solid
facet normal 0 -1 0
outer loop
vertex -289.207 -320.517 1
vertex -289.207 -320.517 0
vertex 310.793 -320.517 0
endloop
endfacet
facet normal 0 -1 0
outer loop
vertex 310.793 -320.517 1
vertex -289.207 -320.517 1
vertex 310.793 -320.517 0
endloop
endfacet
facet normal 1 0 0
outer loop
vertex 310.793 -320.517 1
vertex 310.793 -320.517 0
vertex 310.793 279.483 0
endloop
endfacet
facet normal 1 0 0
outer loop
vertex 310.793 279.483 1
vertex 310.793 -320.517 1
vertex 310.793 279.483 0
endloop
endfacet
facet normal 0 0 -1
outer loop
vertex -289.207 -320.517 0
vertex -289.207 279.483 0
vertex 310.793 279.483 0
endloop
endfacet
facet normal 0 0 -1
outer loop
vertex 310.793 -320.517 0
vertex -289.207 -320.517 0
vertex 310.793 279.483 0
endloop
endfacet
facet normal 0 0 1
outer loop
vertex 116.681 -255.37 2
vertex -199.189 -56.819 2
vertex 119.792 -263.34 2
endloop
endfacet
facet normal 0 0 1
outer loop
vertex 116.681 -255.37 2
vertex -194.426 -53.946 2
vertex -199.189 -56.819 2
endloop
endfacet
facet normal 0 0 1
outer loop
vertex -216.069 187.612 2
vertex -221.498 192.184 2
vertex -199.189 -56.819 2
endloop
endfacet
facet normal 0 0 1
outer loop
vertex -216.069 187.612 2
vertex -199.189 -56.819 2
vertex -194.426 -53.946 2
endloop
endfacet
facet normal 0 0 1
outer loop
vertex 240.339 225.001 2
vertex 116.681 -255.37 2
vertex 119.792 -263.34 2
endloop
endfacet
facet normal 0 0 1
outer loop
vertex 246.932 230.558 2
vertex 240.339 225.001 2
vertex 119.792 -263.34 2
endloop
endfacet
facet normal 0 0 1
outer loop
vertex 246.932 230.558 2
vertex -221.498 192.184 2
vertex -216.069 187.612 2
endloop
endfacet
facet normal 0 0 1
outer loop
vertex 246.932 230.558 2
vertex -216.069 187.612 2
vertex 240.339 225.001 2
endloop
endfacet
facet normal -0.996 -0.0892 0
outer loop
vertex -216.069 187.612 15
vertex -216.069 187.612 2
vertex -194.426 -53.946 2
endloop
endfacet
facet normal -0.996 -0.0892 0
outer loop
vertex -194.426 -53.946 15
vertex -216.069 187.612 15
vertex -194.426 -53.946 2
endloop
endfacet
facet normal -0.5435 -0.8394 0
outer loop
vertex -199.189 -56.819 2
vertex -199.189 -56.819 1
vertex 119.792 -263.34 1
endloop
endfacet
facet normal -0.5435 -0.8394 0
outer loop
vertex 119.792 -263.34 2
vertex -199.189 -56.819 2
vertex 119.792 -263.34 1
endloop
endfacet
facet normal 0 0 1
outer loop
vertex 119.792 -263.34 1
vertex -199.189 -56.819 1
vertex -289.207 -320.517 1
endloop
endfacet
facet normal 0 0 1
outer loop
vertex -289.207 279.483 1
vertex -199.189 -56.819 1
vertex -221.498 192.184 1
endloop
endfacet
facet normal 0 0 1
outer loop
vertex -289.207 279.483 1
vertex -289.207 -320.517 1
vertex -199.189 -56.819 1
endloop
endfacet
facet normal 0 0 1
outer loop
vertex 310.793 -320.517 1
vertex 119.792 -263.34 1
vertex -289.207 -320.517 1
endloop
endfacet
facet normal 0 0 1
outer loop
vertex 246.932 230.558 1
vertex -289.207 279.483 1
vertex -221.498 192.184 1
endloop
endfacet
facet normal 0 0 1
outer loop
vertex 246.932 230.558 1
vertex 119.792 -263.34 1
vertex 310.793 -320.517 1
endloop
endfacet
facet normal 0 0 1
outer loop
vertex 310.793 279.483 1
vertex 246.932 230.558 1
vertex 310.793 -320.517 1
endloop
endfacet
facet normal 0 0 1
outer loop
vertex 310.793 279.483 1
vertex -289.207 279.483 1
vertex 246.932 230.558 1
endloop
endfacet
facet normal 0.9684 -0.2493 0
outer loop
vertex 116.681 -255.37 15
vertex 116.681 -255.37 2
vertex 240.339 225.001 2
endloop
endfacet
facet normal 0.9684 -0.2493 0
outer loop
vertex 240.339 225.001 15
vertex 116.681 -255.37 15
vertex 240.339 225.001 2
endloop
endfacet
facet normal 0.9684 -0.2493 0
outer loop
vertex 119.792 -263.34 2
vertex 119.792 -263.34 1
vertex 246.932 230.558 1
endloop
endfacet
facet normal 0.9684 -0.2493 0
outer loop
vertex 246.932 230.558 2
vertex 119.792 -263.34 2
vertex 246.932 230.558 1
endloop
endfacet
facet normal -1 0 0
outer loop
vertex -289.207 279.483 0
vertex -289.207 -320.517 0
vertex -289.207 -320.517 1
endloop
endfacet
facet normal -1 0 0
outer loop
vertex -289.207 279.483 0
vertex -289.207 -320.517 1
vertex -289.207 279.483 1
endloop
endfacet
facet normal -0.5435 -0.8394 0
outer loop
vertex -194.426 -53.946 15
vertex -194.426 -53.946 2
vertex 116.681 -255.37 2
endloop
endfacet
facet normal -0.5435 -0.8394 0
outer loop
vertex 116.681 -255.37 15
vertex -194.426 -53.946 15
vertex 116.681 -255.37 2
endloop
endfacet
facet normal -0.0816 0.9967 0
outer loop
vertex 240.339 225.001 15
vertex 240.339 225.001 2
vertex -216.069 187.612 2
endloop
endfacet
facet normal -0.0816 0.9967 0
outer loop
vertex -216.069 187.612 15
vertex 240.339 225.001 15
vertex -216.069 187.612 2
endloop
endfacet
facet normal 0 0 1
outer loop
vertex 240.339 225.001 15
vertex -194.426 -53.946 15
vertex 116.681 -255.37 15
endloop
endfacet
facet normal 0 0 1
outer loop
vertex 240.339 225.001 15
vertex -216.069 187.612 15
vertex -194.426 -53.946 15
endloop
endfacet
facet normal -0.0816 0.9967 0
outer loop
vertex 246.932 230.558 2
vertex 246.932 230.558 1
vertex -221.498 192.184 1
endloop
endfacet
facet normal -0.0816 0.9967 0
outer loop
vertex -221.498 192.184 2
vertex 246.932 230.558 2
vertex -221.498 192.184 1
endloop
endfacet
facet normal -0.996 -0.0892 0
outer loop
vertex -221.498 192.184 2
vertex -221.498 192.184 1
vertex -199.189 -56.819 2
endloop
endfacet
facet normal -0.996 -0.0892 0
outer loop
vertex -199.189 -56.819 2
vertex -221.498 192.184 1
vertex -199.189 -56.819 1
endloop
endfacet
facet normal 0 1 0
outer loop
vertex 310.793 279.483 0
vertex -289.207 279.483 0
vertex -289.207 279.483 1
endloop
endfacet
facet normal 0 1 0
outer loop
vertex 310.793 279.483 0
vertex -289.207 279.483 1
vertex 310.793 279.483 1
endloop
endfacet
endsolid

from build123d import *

# Parameters (mm, degrees)
F0_W     = 600
F0_H     = 600
F5_DEPTH = 1
F1_DEPTH = 2
F2_DEPTH = 15


with BuildPart() as f5:
    # F0 (on Top) → F5 (new body)
    with BuildSketch(Plane.XY):
        with Locations((10.792556, -20.516564)):
            Rectangle(F0_W, F0_H)
        Polygon((-221.498368, 192.184042), (246.932485, 230.557681), (119.79194, -263.340367), (-199.188834, -56.818538), align=None, mode=Mode.SUBTRACT)
    extrude(amount=F5_DEPTH)

    # F0 (on Top) → F1 (join)
    with BuildSketch(Plane.XY):
        Polygon((119.79194, -263.340367), (246.932485, 230.557681), (-221.498368, 192.184042), (-199.188834, -56.818538), align=None)
        Polygon((240.339008, 225.000797), (116.680786, -255.369601), (-194.426209, -53.945594), (-216.068713, 187.612088), align=None, mode=Mode.SUBTRACT)
    extrude(amount=F1_DEPTH)

    # F0 (on Top) → F2 (join)
    with BuildSketch(Plane.XY):
        Polygon((-194.426209, -53.945594), (116.680786, -255.369601), (240.339008, 225.000797), (-216.068713, 187.612088), align=None)
    extrude(amount=F2_DEPTH)


solid = f5.part
